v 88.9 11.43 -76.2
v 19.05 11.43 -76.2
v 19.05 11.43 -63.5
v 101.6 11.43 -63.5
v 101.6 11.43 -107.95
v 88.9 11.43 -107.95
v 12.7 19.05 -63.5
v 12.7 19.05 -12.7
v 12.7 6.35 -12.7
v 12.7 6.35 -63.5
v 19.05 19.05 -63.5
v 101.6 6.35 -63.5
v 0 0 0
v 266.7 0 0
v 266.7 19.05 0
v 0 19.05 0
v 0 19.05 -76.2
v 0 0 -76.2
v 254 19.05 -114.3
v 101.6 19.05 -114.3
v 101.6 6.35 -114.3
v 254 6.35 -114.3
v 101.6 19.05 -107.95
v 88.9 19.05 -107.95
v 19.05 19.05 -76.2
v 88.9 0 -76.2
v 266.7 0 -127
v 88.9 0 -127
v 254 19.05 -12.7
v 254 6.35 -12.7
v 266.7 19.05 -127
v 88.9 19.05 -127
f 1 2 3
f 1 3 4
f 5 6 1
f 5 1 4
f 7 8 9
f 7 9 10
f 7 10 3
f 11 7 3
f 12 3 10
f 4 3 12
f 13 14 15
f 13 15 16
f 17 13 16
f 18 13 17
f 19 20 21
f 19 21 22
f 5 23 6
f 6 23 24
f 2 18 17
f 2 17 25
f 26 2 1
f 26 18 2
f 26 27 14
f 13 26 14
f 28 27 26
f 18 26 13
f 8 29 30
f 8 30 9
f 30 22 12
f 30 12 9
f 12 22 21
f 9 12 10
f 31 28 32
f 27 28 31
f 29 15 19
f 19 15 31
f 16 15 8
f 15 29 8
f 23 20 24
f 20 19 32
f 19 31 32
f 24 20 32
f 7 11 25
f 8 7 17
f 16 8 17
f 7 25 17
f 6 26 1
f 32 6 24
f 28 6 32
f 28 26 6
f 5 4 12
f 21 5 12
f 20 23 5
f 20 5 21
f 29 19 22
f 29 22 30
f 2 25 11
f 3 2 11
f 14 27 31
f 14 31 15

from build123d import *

# Parameters (mm, degrees)
BOSS_EXTRUDE1_DEPTH = 19.05
CUT_EXTRUDE1_DEPTH  = 12.7
CUT_EXTRUDE2_DEPTH  = 7.62


with BuildPart() as part:
    # Sketch1 → Boss-Extrude1 (new body)
    with BuildSketch(Plane(origin=(0, 0, 0), x_dir=(1, 0, 0), z_dir=(0, 1, 0))):
        Polygon((0, 0), (0, 76.2), (88.9, 76.2), (88.9, 127), (266.7, 127), (266.7, 0), align=None)
    extrude(amount=BOSS_EXTRUDE1_DEPTH)

    # Sketch2 → Cut-Extrude1 (cut)
    with BuildSketch(Plane(origin=(0, 19.05, 0), x_dir=(1, 0, 0), z_dir=(0, 1, 0))):
        Polygon((12.7, 63.5), (101.6, 63.5), (101.6, 114.3), (254, 114.3), (254, 12.7), (12.7, 12.7), align=None)
    extrude(amount=-CUT_EXTRUDE1_DEPTH, mode=Mode.SUBTRACT)

    # Sketch3 → Cut-Extrude2 (cut)
    with BuildSketch(Plane(origin=(0, 19.05, 0), x_dir=(1, 0, 0), z_dir=(0, 1, 0))):
        Polygon((19.05, 76.2), (19.05, 63.5), (101.6, 63.5), (101.6, 107.95), (88.9, 107.95), (88.9, 76.2), align=None)
    extrude(amount=-CUT_EXTRUDE2_DEPTH, mode=Mode.SUBTRACT)


solid = part.part
